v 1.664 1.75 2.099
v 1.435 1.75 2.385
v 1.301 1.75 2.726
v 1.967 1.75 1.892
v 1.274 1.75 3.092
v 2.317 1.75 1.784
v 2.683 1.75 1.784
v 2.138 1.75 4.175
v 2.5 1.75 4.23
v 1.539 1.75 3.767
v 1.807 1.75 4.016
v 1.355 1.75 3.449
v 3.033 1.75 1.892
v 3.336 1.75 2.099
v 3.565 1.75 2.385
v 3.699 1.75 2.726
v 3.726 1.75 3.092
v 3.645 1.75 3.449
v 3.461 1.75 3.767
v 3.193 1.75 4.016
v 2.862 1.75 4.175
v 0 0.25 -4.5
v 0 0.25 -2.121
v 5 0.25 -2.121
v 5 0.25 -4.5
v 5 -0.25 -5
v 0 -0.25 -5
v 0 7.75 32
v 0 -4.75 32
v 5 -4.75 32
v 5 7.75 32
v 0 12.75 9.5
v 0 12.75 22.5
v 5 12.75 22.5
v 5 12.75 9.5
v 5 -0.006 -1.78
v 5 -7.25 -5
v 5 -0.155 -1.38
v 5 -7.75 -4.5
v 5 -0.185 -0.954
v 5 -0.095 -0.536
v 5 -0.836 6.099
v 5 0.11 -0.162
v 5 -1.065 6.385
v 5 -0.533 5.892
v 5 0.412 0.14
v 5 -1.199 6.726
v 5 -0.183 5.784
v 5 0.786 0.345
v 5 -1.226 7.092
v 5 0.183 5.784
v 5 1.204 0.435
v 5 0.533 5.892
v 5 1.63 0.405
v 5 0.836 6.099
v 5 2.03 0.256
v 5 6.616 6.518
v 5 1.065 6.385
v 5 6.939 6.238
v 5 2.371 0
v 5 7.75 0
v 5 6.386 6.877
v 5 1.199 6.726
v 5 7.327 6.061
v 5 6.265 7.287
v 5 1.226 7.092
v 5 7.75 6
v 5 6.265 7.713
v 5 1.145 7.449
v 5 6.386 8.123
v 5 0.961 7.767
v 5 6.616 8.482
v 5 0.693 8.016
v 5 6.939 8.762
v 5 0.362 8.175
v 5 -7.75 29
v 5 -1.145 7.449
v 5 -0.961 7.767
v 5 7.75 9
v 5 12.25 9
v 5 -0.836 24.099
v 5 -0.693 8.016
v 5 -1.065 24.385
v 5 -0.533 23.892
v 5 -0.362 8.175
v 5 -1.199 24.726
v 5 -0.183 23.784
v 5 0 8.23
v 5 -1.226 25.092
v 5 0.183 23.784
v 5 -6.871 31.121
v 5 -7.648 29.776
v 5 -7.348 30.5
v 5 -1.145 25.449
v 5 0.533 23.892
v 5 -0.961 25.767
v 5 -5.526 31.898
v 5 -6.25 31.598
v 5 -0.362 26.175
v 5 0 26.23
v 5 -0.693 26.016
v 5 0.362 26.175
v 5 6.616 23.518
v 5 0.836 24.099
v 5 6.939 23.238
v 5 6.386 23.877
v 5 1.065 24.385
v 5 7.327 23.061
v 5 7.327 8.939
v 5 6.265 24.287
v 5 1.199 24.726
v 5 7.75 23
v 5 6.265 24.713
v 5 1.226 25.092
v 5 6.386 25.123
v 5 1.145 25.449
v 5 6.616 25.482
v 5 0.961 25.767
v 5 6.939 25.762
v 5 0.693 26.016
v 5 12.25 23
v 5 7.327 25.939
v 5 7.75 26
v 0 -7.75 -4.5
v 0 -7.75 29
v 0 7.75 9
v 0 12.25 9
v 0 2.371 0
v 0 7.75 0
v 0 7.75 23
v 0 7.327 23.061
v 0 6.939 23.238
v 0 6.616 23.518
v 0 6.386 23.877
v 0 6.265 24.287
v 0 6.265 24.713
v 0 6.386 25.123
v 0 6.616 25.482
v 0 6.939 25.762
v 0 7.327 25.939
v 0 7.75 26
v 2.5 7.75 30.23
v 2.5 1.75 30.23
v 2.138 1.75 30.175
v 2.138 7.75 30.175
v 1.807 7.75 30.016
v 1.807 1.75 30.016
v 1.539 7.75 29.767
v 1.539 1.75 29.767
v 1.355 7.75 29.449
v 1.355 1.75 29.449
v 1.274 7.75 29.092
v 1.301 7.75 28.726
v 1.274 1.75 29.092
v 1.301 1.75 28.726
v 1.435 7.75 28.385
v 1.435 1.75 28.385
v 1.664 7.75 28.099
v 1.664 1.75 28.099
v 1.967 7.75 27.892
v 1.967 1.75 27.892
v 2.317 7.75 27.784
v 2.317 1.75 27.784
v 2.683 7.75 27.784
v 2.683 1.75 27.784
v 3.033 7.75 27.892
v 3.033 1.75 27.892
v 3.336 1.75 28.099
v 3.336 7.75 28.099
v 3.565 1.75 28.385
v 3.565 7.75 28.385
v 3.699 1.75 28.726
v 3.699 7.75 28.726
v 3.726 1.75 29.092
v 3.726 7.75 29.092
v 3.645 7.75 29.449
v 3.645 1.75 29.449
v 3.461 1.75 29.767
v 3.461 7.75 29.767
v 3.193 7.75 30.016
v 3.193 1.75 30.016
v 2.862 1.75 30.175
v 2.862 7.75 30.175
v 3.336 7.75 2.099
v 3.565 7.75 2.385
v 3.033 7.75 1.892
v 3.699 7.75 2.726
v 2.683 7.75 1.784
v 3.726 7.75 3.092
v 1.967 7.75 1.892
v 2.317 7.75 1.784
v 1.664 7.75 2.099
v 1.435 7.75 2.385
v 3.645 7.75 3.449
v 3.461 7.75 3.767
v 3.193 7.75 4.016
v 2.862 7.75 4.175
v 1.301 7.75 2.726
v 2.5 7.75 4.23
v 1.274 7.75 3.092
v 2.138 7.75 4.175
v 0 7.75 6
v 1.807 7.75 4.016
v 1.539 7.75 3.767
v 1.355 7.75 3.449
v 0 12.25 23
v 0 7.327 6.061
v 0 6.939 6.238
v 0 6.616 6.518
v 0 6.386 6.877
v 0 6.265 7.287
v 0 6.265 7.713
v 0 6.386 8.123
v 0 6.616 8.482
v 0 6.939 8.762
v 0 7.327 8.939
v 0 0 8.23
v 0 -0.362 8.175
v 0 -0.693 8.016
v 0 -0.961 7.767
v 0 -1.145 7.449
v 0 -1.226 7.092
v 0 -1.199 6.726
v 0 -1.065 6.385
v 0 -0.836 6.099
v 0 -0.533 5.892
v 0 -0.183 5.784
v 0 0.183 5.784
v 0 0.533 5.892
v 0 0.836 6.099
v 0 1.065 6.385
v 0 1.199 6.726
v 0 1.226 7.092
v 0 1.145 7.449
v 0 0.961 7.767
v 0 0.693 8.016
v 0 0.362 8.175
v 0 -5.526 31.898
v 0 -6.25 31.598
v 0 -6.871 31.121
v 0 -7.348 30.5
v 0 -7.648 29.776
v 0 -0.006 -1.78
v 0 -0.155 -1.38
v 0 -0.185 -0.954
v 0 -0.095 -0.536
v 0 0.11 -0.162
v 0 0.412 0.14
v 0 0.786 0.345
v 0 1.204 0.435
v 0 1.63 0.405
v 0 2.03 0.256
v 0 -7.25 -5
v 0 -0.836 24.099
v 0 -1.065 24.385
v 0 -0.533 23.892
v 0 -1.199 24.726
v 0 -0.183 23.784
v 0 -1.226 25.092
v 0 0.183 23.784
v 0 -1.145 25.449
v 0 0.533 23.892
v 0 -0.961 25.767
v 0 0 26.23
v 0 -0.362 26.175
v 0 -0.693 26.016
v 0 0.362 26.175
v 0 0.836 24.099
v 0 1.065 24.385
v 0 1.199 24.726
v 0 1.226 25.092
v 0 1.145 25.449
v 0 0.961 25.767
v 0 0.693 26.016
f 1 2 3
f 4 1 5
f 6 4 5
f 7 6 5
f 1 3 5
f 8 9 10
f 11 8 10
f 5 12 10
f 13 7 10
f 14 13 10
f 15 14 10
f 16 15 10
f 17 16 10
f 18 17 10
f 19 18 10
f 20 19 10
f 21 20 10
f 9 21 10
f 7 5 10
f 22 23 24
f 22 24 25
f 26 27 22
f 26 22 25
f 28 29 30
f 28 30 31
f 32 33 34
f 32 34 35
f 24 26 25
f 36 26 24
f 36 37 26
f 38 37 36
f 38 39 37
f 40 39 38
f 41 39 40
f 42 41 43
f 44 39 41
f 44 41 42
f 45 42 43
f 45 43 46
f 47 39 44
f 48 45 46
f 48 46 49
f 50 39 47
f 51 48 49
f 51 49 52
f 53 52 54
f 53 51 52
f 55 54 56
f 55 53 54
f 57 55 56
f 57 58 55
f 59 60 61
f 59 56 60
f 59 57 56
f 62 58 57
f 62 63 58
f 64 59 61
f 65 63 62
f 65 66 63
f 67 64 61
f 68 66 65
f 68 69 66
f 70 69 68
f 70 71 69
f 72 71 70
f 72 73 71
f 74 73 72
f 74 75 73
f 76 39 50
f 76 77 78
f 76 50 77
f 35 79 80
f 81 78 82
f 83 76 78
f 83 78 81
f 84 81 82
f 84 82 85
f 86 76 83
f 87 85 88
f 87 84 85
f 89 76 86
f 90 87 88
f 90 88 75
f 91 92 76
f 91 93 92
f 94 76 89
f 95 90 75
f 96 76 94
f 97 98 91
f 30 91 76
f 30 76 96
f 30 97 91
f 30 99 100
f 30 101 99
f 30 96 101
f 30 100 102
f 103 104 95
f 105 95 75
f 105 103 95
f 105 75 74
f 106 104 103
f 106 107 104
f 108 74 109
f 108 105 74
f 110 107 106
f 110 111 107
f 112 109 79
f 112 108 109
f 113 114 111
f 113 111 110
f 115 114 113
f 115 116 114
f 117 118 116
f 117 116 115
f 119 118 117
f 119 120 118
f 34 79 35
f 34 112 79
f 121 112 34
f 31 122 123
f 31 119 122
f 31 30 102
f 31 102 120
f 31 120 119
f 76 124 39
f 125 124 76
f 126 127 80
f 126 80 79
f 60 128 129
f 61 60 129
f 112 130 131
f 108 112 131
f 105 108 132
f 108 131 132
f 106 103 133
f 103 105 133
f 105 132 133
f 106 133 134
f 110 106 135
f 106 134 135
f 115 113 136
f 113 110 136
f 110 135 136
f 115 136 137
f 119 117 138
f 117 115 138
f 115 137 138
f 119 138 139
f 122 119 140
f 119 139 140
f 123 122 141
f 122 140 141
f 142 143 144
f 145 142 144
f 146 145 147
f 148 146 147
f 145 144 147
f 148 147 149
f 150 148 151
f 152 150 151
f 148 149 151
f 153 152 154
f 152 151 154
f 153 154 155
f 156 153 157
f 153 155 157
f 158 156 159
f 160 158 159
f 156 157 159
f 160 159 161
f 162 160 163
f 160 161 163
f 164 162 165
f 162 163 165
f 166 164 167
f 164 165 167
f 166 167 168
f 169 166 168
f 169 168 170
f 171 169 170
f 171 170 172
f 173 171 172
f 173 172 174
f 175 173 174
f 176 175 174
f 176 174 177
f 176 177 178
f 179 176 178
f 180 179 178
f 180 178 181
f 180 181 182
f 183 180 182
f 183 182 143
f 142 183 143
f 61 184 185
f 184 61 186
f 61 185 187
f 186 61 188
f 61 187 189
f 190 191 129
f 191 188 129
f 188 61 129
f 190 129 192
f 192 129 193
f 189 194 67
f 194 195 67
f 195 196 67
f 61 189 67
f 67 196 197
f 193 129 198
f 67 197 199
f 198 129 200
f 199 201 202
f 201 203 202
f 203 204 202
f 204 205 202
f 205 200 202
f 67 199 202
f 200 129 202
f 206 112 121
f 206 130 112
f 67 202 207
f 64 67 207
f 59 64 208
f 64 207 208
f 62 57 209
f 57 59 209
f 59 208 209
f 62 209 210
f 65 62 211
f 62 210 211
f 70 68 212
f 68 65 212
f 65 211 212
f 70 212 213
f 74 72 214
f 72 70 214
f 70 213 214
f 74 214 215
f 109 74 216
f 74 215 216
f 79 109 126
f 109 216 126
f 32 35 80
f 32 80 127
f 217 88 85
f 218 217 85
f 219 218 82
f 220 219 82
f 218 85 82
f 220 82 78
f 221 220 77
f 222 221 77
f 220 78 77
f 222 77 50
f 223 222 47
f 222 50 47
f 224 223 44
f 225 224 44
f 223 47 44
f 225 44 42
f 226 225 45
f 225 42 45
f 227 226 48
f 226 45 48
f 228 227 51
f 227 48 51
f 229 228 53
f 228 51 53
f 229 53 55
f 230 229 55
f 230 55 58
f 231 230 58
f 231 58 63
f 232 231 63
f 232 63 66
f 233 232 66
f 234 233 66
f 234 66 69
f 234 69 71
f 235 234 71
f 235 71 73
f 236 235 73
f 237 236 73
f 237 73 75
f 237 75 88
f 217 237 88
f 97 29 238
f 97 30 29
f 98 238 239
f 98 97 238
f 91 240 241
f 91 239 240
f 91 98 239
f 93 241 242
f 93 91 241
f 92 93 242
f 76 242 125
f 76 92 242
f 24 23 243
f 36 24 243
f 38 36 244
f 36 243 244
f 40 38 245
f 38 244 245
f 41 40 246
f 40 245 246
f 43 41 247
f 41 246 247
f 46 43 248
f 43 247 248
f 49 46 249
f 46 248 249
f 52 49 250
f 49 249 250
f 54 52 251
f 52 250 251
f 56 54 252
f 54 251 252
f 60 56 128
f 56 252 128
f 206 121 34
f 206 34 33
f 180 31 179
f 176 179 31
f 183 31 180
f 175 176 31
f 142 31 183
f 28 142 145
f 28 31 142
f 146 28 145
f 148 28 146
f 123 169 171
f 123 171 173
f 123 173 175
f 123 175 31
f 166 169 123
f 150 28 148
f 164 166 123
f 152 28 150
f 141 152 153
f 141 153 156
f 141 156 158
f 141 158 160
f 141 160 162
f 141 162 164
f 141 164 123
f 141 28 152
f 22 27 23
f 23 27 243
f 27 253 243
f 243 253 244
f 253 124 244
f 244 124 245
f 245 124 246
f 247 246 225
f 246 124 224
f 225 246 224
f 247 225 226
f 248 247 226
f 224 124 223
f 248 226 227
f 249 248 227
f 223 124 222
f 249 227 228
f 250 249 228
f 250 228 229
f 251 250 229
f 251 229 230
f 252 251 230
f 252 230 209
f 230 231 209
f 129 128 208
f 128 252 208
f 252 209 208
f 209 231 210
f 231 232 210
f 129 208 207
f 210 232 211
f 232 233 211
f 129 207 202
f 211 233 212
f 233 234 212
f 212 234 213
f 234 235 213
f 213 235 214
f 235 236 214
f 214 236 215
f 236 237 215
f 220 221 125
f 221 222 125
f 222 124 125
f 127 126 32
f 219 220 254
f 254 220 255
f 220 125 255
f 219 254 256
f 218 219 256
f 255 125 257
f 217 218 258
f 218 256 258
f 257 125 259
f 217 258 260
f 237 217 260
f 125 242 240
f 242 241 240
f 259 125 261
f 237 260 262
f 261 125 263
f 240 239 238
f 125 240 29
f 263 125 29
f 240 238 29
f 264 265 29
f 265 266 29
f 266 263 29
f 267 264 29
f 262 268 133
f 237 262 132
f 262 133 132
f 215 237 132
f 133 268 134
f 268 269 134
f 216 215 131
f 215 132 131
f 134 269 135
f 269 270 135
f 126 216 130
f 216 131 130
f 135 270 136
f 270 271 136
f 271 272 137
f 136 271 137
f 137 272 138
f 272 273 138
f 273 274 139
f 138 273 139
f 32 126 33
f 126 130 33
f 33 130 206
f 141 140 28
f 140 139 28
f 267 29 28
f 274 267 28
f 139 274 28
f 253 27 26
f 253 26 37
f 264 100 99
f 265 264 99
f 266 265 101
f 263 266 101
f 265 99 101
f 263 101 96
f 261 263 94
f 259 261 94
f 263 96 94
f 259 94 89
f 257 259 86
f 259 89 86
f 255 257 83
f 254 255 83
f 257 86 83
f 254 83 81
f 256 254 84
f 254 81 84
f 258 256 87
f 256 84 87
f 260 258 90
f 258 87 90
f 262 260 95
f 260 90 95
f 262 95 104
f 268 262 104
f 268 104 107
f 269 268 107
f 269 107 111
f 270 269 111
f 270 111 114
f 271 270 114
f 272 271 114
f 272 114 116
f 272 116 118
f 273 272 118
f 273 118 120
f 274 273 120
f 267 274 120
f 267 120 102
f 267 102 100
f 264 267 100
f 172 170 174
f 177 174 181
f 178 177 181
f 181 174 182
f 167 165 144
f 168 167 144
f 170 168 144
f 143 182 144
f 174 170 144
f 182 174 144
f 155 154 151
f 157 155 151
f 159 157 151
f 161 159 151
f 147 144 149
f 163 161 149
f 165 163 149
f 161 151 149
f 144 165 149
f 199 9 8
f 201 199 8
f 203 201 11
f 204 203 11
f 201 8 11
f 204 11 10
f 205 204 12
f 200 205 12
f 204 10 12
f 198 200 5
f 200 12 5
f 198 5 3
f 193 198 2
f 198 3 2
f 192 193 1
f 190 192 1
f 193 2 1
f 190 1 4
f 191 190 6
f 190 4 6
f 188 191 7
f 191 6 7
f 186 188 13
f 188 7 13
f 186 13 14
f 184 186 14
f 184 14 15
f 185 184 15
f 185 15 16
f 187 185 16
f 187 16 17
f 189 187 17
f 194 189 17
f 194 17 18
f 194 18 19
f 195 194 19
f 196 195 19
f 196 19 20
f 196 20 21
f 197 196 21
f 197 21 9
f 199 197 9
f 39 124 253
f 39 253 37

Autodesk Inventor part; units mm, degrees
ref_plane "YZ Plane" through (0, 0, 0) normal (1, 0, 0) x (0, 1, 0)
ref_plane "XZ Plane" through (0, 0, 0) normal (0, 1, 0) x (-1, 0, 0)
ref_plane "XY Plane" through (0, 0, 0) normal (0, 0, 1) x (1, 0, 0)
sketch "Sketch1" plane through (0, 0, 0) normal (1, 0, 0) x (0, 1, 0)
  line L0 (0.25, 0) -> (0.25, -5)
  line L1 (0.25, -5) -> (-7.75, -5)
  line L2 (-7.75, -5) -> (-7.75, 32)
  line L3 (-7.75, 32) -> (7.75, 32)
  line L4 (7.75, 32) -> (7.75, 23)
  line L5 (7.75, 23) -> (12.75, 23)
  line L6 (12.75, 23) -> (12.75, 9)
  line L7 (12.75, 9) -> (7.75, 9)
  line L8 (0.25, 0) -> (7.75, 0)
  line L9 (7.75, 0) -> (7.75, 9)
  line L10 (0, -5) -> (0, 32) construction
  line L11 (12.75, 16) -> (-7.75, 16) construction
  arc A0 (7.75, 26) -> (7.75, 23) centre (7.75, 24.5) ccw
  arc A1 (7.75, 9) -> (7.75, 6) centre (7.75, 7.5) ccw
  arc A2 (2.3713, 0) -> (0.25, -2.1213) centre (1.3107, -1.0607) ccw
  line L12 (7.75, 29) -> (1.75, 29) construction
  line L13 (7.75, 3) -> (1.75, 3) construction
  point P0 (0, 0)
  point P1 (0, 25)
  point P2 (0, 7)
  point P3 (7.75, 6)
  point P4 (4.1709, -1.359)
  point P5 (4.291, 0)
  dimension "d6" = 5
  dimension "d7" = 14
  dimension "d8" = 5
  dimension "d9" = 18
  dimension "d12" = 6
  dimension "d13" = 6
  dimension "d31" = 9
  dimension "d32" = 1.5
  dimension "d33" = 32
  dimension "d34" = 8
  dimension "d35" = 15.5
extrude "Extrusion1" add sketch "Sketch1" along normal blind 5 contours A2 L0 L1 L2 L3 L4 A0 L5 L6 L7 A1 L9 L8
sketch "Sketch2" plane through (0, 7.75, 32) normal (0, 1, 0) x (1, 0, 0)
  line L0 (5, 3) -> (0, 3)
  line L1 (0, 9) -> (0, 0) projected
  line L2 (5, 32) -> (5, 23) projected
  line L3 (5, 29) -> (0, 29)
  line L4 (5, 9) -> (5, 0) projected
  point P0 (0, 32)
  point P1 (0, 6)
  point P2 (5, 26)
  point P3 (5, 6)
  point P4 (0, 29)
  point P5 (0, 29)
  point P6 (0, 29)
  point P7 (2.5, 29)
  point P8 (2.5, 3)
hole "Hole1" at (2.5, 7.75, 3) at (2.5, 7.75, 29) direction (0, -1, 0) diameter 2.459 depth 6 thread size "M3x0.5" class "6H" standard "ANSI Metric M Profile"
hole "Hole2" at (0, 0, 25) at (0, 0, 7) direction (1, 0, 0) diameter 2.459 end through all thread size "M3x0.5" class "6H" standard "ANSI Metric M Profile"
chamfer "Chamfer1" distance 0.5 angle 45 4 edges at (2.5, -7.75, -5) (2.5, 0.25, -5) (2.5, 12.75, 9) (2.5, 12.75, 23)
fillet "Fillet1" radius 3 1 edges at (2.5, -7.75, 32)
properties part number "TorsoAngleBraceFrame" material "Acetal Resin, Black"
